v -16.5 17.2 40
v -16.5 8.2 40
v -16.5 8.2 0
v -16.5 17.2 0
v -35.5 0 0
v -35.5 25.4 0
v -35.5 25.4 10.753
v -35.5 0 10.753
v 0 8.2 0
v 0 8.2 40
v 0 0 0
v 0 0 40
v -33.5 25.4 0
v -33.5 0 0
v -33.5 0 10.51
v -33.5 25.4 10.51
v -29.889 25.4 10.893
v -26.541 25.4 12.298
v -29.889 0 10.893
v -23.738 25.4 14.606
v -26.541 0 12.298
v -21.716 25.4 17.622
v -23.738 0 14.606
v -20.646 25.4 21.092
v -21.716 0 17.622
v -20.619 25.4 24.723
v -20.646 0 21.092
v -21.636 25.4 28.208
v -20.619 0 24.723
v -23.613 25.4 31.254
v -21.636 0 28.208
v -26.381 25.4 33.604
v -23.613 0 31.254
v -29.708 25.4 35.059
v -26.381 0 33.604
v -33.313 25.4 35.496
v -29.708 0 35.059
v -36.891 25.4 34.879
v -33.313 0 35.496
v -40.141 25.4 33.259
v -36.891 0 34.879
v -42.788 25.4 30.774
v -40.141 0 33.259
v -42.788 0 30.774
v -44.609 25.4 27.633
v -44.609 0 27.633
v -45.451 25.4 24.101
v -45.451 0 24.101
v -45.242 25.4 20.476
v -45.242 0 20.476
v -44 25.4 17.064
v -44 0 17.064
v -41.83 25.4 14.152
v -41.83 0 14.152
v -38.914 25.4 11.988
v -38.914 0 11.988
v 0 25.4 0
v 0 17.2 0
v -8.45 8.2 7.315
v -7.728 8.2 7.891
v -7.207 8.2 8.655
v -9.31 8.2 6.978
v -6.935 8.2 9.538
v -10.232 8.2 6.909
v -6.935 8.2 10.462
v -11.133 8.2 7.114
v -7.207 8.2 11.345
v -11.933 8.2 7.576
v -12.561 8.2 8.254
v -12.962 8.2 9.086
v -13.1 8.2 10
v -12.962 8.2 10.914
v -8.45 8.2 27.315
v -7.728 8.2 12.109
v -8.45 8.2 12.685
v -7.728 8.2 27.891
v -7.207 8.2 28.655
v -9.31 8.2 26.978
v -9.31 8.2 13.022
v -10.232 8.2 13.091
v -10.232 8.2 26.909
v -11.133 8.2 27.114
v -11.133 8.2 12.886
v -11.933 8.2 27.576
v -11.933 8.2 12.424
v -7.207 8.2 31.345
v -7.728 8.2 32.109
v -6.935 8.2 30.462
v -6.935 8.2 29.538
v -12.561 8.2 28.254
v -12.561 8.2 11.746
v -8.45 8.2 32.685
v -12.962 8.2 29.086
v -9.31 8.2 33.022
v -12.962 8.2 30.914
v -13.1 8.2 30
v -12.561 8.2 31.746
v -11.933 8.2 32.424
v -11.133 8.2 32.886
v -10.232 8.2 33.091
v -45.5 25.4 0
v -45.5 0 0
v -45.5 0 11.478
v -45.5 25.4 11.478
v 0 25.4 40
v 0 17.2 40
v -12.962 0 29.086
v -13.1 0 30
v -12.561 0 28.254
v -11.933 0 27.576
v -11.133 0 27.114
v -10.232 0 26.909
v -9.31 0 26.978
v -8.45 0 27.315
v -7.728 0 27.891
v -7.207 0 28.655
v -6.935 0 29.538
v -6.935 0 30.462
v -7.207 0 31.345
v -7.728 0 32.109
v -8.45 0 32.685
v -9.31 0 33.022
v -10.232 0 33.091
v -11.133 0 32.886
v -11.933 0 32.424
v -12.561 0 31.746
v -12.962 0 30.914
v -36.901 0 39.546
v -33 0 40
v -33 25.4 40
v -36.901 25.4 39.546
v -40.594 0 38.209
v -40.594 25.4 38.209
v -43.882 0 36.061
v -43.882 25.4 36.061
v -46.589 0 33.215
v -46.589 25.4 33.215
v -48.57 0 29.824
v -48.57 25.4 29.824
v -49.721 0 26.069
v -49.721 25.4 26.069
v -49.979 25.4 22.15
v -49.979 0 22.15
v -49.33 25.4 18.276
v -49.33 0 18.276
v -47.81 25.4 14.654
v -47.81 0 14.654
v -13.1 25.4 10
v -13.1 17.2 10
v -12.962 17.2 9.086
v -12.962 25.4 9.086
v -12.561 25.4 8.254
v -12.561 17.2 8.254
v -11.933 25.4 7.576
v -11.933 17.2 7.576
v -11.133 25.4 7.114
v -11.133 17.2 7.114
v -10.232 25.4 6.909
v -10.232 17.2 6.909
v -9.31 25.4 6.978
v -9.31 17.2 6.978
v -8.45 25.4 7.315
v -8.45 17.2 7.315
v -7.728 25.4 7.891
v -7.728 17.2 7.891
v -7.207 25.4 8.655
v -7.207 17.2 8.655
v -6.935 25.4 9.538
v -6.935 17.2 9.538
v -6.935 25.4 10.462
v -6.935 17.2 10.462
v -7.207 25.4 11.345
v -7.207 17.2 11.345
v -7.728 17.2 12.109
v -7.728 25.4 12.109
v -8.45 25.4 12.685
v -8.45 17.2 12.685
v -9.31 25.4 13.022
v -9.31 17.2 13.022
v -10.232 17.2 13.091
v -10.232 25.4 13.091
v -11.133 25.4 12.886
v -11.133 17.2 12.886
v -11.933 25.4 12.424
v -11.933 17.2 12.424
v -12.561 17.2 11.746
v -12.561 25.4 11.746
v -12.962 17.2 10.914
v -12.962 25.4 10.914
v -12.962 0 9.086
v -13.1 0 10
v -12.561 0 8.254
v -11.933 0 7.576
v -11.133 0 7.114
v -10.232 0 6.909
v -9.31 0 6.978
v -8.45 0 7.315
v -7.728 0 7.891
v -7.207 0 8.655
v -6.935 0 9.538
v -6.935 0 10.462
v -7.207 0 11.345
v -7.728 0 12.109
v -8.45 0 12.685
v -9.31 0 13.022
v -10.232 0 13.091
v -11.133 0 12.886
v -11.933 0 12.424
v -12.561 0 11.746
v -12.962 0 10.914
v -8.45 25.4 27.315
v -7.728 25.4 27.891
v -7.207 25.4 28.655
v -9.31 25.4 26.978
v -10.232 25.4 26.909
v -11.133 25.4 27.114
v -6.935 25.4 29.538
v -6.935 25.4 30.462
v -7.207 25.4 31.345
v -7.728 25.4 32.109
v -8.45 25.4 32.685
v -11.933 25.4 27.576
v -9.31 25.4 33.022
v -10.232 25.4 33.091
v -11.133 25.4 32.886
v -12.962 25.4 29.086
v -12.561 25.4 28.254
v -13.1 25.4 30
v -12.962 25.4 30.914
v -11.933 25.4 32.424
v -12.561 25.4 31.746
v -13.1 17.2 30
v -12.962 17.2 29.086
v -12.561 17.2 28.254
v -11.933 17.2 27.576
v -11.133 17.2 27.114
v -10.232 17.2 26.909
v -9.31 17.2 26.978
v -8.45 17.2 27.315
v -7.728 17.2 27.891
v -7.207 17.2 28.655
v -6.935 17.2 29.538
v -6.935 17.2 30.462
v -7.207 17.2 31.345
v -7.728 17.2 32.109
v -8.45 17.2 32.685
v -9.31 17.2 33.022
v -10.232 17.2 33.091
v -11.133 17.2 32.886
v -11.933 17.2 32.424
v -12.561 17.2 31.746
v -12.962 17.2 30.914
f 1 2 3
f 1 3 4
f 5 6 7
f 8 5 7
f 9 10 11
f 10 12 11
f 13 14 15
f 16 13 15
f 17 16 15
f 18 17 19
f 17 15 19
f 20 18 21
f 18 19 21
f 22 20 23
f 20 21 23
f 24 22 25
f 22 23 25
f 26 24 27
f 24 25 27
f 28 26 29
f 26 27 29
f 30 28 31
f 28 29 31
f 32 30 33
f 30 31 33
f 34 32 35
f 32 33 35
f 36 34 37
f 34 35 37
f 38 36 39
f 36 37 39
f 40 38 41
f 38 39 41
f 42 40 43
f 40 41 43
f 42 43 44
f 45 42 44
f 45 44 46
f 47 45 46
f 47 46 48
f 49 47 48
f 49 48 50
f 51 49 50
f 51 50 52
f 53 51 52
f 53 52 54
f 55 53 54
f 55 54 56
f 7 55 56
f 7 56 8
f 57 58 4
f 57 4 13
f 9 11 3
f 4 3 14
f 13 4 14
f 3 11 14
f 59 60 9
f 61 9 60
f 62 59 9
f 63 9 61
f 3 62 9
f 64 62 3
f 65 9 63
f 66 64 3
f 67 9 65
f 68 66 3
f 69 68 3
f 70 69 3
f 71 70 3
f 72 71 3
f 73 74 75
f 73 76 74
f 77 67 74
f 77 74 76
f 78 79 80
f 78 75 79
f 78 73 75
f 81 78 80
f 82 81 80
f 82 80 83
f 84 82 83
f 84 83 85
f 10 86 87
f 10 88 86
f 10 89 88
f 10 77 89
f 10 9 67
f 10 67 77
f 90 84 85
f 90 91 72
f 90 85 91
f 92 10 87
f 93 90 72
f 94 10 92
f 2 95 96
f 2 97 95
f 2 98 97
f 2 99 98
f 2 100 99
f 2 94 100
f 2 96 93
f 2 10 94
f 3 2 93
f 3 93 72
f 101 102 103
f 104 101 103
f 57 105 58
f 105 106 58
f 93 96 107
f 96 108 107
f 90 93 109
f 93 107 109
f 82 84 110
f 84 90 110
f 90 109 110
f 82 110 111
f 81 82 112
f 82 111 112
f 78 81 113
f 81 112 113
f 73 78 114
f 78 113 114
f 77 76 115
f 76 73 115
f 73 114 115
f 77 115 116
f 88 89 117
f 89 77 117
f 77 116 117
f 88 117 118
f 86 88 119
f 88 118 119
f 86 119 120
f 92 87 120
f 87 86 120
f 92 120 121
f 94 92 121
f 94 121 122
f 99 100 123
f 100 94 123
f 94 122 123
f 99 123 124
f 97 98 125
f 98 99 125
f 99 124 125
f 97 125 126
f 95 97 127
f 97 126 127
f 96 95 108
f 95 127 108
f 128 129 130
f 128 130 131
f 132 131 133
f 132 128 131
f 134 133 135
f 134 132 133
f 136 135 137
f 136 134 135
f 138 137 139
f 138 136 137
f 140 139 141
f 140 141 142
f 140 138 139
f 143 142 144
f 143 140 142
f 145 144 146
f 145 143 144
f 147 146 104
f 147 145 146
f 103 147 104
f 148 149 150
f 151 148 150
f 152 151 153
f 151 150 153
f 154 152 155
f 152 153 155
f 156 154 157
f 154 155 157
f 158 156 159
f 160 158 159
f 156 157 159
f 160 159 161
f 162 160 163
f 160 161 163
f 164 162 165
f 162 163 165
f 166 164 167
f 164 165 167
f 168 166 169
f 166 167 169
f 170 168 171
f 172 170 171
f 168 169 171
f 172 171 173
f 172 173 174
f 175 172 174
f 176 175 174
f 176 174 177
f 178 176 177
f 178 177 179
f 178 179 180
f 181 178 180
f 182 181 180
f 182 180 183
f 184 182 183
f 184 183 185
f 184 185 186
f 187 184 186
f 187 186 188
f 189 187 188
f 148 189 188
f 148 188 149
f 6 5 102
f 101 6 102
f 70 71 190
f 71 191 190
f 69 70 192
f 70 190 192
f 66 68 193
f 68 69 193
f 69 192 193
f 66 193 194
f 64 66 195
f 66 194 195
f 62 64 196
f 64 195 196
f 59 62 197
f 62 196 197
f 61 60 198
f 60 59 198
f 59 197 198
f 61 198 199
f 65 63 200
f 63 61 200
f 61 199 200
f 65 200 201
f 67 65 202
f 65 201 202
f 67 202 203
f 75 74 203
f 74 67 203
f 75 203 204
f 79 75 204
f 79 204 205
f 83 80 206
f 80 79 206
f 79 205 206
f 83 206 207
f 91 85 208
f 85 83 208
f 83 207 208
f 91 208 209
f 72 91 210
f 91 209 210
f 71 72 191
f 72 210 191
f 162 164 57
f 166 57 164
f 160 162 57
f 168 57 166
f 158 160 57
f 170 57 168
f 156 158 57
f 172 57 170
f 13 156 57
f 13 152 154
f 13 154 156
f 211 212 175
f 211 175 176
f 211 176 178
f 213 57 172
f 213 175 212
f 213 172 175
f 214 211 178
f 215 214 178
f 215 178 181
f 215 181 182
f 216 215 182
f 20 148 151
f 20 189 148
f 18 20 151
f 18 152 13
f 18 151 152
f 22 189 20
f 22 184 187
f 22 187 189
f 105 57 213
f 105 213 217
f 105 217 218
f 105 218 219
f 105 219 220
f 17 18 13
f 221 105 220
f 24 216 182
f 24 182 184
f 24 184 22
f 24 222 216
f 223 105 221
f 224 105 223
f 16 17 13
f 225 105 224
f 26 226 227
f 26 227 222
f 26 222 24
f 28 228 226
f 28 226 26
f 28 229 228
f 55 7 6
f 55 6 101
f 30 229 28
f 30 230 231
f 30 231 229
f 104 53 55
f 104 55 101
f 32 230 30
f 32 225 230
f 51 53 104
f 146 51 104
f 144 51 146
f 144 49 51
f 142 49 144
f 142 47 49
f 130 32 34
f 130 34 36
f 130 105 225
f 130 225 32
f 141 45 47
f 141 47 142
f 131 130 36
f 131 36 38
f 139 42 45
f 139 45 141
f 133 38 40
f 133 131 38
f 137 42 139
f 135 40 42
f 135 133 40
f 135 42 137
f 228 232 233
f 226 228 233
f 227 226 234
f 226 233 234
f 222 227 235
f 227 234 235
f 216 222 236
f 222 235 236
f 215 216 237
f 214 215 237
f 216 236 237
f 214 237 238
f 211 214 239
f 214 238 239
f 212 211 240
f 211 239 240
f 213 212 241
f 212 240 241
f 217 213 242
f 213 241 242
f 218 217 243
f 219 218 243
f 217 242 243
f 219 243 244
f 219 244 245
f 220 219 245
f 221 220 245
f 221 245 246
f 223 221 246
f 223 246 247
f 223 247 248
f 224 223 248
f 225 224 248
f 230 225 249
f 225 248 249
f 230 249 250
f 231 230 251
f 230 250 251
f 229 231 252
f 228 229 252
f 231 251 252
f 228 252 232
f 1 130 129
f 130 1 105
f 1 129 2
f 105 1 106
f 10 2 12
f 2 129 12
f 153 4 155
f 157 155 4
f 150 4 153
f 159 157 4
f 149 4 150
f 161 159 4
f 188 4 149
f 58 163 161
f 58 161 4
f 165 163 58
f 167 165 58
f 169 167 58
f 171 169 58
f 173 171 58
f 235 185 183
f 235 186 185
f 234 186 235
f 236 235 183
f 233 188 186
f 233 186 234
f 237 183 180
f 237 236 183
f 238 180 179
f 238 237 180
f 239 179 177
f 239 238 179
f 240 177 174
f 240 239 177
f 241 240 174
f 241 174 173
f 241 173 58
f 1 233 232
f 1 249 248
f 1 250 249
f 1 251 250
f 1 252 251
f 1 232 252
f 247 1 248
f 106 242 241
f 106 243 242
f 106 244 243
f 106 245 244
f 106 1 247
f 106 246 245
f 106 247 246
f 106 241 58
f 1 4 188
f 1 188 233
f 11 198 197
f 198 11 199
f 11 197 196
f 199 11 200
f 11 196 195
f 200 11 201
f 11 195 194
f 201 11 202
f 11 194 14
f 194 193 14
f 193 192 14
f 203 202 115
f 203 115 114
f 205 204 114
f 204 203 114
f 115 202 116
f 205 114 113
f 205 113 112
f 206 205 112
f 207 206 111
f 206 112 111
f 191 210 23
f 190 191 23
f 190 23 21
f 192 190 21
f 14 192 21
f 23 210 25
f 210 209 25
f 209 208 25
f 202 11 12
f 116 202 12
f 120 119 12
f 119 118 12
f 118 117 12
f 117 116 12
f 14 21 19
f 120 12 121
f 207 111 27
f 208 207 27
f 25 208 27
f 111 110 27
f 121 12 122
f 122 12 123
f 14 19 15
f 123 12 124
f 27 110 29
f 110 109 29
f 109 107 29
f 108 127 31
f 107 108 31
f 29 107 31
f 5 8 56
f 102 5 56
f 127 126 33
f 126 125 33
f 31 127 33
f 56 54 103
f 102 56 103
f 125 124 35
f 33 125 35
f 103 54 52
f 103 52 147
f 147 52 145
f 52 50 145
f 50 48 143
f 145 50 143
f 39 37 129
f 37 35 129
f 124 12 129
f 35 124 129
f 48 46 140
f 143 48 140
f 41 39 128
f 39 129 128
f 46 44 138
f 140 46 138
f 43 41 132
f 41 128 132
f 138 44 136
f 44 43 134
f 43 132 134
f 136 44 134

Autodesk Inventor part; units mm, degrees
ref_plane "YZ Plane" through (0, 0, 0) normal (1, 0, 0) x (0, 1, 0)
ref_plane "XZ Plane" through (0, 0, 0) normal (0, 1, 0) x (-1, 0, 0)
ref_plane "XY Plane" through (0, 0, 0) normal (0, 0, 1) x (1, 0, 0)
sketch "Sketch1" plane through (0, 0, 0) normal (0, 1, 0) x (-1, 0, 0)
  line L0 (50, 0) -> (50, 40)
  line L1 (50, 40) -> (0, 40)
  line L2 (0, 40) -> (0, 0)
  line L3 (0, 0) -> (10, 0)
  line L4 (10, 0) -> (10, 10)
  line L5 (10, 10) -> (10, 30)
  circle A0 centre (10, 30) radius 3.1
  circle A1 centre (10, 10) radius 3.1
  line L6 (45.5, 0) -> (45.5, 11.4783)
  line L7 (0, 0) -> (33.5, 0)
  line L8 (35.5, 0) -> (35.5, 10.7526)
  line L9 (50, 40) -> (45.5, 40)
  line L10 (45.5, 40) -> (45.5, 35.5)
  line L11 (45.5, 35.5) -> (45.5, 34.5217)
  line L12 (45.5, 23) -> (33, 23)
  arc A2 (35.5, 10.7526) -> (33.5, 10.51) centre (33, 23) ccw
  arc A3 (45.5, 11.4783) -> (33, 40) centre (33, 23) ccw
  line L13 (0, 0) -> (33.5, 0)
  line L14 (35.5, 0) -> (45.5, 0)
  line L15 (33.5, 0) -> (33.5, 10.51)
  line L16 (0, 0) -> (33.5, 0)
  line L17 (35.5, 0) -> (45.5, 0)
  dimension "d0" = 50
  dimension "d1" = 40
  dimension "d2" = 10
  dimension "d3" = 10
  dimension "d4" = 20
  dimension "d5" = 6.2
  dimension "d6" = 6.2
  dimension "d7" = 45.5
  dimension "d8" = 35.5
  dimension "d9" = 4.5
  dimension "d10" = 4.5
  dimension "d11" = 12.5
  dimension "d12" = 12.5
  dimension "d13" = 2
extrude "Extrusion1" add sketch "Sketch1" along normal blind 25.4 contours A3 L6 L14 L8 A2 L15 L7 L3 L2 L1
sketch "Sketch2" plane through (-33, 0, 40) normal (0, 0, 1) x (1, 0, 0)
  line L0 (33, 0) -> (33, 8.2)
  line L1 (33, 0) -> (33, 25.4)
  line L2 (33, 8.2) -> (16.5, 8.2)
  line L3 (16.5, 8.2) -> (16.5, 17.2)
  line L4 (16.5, 17.2) -> (33, 17.2)
  line L5 (33, 17.2) -> (33, 8.2)
  dimension "d16" = 8.2
  dimension "d17" = 16.5
  dimension "d18" = 9
extrude "Extrusion2" cut sketch "Sketch2" against normal through all
properties part number "suporte-eixo-new" material "Steel, Carbon"
